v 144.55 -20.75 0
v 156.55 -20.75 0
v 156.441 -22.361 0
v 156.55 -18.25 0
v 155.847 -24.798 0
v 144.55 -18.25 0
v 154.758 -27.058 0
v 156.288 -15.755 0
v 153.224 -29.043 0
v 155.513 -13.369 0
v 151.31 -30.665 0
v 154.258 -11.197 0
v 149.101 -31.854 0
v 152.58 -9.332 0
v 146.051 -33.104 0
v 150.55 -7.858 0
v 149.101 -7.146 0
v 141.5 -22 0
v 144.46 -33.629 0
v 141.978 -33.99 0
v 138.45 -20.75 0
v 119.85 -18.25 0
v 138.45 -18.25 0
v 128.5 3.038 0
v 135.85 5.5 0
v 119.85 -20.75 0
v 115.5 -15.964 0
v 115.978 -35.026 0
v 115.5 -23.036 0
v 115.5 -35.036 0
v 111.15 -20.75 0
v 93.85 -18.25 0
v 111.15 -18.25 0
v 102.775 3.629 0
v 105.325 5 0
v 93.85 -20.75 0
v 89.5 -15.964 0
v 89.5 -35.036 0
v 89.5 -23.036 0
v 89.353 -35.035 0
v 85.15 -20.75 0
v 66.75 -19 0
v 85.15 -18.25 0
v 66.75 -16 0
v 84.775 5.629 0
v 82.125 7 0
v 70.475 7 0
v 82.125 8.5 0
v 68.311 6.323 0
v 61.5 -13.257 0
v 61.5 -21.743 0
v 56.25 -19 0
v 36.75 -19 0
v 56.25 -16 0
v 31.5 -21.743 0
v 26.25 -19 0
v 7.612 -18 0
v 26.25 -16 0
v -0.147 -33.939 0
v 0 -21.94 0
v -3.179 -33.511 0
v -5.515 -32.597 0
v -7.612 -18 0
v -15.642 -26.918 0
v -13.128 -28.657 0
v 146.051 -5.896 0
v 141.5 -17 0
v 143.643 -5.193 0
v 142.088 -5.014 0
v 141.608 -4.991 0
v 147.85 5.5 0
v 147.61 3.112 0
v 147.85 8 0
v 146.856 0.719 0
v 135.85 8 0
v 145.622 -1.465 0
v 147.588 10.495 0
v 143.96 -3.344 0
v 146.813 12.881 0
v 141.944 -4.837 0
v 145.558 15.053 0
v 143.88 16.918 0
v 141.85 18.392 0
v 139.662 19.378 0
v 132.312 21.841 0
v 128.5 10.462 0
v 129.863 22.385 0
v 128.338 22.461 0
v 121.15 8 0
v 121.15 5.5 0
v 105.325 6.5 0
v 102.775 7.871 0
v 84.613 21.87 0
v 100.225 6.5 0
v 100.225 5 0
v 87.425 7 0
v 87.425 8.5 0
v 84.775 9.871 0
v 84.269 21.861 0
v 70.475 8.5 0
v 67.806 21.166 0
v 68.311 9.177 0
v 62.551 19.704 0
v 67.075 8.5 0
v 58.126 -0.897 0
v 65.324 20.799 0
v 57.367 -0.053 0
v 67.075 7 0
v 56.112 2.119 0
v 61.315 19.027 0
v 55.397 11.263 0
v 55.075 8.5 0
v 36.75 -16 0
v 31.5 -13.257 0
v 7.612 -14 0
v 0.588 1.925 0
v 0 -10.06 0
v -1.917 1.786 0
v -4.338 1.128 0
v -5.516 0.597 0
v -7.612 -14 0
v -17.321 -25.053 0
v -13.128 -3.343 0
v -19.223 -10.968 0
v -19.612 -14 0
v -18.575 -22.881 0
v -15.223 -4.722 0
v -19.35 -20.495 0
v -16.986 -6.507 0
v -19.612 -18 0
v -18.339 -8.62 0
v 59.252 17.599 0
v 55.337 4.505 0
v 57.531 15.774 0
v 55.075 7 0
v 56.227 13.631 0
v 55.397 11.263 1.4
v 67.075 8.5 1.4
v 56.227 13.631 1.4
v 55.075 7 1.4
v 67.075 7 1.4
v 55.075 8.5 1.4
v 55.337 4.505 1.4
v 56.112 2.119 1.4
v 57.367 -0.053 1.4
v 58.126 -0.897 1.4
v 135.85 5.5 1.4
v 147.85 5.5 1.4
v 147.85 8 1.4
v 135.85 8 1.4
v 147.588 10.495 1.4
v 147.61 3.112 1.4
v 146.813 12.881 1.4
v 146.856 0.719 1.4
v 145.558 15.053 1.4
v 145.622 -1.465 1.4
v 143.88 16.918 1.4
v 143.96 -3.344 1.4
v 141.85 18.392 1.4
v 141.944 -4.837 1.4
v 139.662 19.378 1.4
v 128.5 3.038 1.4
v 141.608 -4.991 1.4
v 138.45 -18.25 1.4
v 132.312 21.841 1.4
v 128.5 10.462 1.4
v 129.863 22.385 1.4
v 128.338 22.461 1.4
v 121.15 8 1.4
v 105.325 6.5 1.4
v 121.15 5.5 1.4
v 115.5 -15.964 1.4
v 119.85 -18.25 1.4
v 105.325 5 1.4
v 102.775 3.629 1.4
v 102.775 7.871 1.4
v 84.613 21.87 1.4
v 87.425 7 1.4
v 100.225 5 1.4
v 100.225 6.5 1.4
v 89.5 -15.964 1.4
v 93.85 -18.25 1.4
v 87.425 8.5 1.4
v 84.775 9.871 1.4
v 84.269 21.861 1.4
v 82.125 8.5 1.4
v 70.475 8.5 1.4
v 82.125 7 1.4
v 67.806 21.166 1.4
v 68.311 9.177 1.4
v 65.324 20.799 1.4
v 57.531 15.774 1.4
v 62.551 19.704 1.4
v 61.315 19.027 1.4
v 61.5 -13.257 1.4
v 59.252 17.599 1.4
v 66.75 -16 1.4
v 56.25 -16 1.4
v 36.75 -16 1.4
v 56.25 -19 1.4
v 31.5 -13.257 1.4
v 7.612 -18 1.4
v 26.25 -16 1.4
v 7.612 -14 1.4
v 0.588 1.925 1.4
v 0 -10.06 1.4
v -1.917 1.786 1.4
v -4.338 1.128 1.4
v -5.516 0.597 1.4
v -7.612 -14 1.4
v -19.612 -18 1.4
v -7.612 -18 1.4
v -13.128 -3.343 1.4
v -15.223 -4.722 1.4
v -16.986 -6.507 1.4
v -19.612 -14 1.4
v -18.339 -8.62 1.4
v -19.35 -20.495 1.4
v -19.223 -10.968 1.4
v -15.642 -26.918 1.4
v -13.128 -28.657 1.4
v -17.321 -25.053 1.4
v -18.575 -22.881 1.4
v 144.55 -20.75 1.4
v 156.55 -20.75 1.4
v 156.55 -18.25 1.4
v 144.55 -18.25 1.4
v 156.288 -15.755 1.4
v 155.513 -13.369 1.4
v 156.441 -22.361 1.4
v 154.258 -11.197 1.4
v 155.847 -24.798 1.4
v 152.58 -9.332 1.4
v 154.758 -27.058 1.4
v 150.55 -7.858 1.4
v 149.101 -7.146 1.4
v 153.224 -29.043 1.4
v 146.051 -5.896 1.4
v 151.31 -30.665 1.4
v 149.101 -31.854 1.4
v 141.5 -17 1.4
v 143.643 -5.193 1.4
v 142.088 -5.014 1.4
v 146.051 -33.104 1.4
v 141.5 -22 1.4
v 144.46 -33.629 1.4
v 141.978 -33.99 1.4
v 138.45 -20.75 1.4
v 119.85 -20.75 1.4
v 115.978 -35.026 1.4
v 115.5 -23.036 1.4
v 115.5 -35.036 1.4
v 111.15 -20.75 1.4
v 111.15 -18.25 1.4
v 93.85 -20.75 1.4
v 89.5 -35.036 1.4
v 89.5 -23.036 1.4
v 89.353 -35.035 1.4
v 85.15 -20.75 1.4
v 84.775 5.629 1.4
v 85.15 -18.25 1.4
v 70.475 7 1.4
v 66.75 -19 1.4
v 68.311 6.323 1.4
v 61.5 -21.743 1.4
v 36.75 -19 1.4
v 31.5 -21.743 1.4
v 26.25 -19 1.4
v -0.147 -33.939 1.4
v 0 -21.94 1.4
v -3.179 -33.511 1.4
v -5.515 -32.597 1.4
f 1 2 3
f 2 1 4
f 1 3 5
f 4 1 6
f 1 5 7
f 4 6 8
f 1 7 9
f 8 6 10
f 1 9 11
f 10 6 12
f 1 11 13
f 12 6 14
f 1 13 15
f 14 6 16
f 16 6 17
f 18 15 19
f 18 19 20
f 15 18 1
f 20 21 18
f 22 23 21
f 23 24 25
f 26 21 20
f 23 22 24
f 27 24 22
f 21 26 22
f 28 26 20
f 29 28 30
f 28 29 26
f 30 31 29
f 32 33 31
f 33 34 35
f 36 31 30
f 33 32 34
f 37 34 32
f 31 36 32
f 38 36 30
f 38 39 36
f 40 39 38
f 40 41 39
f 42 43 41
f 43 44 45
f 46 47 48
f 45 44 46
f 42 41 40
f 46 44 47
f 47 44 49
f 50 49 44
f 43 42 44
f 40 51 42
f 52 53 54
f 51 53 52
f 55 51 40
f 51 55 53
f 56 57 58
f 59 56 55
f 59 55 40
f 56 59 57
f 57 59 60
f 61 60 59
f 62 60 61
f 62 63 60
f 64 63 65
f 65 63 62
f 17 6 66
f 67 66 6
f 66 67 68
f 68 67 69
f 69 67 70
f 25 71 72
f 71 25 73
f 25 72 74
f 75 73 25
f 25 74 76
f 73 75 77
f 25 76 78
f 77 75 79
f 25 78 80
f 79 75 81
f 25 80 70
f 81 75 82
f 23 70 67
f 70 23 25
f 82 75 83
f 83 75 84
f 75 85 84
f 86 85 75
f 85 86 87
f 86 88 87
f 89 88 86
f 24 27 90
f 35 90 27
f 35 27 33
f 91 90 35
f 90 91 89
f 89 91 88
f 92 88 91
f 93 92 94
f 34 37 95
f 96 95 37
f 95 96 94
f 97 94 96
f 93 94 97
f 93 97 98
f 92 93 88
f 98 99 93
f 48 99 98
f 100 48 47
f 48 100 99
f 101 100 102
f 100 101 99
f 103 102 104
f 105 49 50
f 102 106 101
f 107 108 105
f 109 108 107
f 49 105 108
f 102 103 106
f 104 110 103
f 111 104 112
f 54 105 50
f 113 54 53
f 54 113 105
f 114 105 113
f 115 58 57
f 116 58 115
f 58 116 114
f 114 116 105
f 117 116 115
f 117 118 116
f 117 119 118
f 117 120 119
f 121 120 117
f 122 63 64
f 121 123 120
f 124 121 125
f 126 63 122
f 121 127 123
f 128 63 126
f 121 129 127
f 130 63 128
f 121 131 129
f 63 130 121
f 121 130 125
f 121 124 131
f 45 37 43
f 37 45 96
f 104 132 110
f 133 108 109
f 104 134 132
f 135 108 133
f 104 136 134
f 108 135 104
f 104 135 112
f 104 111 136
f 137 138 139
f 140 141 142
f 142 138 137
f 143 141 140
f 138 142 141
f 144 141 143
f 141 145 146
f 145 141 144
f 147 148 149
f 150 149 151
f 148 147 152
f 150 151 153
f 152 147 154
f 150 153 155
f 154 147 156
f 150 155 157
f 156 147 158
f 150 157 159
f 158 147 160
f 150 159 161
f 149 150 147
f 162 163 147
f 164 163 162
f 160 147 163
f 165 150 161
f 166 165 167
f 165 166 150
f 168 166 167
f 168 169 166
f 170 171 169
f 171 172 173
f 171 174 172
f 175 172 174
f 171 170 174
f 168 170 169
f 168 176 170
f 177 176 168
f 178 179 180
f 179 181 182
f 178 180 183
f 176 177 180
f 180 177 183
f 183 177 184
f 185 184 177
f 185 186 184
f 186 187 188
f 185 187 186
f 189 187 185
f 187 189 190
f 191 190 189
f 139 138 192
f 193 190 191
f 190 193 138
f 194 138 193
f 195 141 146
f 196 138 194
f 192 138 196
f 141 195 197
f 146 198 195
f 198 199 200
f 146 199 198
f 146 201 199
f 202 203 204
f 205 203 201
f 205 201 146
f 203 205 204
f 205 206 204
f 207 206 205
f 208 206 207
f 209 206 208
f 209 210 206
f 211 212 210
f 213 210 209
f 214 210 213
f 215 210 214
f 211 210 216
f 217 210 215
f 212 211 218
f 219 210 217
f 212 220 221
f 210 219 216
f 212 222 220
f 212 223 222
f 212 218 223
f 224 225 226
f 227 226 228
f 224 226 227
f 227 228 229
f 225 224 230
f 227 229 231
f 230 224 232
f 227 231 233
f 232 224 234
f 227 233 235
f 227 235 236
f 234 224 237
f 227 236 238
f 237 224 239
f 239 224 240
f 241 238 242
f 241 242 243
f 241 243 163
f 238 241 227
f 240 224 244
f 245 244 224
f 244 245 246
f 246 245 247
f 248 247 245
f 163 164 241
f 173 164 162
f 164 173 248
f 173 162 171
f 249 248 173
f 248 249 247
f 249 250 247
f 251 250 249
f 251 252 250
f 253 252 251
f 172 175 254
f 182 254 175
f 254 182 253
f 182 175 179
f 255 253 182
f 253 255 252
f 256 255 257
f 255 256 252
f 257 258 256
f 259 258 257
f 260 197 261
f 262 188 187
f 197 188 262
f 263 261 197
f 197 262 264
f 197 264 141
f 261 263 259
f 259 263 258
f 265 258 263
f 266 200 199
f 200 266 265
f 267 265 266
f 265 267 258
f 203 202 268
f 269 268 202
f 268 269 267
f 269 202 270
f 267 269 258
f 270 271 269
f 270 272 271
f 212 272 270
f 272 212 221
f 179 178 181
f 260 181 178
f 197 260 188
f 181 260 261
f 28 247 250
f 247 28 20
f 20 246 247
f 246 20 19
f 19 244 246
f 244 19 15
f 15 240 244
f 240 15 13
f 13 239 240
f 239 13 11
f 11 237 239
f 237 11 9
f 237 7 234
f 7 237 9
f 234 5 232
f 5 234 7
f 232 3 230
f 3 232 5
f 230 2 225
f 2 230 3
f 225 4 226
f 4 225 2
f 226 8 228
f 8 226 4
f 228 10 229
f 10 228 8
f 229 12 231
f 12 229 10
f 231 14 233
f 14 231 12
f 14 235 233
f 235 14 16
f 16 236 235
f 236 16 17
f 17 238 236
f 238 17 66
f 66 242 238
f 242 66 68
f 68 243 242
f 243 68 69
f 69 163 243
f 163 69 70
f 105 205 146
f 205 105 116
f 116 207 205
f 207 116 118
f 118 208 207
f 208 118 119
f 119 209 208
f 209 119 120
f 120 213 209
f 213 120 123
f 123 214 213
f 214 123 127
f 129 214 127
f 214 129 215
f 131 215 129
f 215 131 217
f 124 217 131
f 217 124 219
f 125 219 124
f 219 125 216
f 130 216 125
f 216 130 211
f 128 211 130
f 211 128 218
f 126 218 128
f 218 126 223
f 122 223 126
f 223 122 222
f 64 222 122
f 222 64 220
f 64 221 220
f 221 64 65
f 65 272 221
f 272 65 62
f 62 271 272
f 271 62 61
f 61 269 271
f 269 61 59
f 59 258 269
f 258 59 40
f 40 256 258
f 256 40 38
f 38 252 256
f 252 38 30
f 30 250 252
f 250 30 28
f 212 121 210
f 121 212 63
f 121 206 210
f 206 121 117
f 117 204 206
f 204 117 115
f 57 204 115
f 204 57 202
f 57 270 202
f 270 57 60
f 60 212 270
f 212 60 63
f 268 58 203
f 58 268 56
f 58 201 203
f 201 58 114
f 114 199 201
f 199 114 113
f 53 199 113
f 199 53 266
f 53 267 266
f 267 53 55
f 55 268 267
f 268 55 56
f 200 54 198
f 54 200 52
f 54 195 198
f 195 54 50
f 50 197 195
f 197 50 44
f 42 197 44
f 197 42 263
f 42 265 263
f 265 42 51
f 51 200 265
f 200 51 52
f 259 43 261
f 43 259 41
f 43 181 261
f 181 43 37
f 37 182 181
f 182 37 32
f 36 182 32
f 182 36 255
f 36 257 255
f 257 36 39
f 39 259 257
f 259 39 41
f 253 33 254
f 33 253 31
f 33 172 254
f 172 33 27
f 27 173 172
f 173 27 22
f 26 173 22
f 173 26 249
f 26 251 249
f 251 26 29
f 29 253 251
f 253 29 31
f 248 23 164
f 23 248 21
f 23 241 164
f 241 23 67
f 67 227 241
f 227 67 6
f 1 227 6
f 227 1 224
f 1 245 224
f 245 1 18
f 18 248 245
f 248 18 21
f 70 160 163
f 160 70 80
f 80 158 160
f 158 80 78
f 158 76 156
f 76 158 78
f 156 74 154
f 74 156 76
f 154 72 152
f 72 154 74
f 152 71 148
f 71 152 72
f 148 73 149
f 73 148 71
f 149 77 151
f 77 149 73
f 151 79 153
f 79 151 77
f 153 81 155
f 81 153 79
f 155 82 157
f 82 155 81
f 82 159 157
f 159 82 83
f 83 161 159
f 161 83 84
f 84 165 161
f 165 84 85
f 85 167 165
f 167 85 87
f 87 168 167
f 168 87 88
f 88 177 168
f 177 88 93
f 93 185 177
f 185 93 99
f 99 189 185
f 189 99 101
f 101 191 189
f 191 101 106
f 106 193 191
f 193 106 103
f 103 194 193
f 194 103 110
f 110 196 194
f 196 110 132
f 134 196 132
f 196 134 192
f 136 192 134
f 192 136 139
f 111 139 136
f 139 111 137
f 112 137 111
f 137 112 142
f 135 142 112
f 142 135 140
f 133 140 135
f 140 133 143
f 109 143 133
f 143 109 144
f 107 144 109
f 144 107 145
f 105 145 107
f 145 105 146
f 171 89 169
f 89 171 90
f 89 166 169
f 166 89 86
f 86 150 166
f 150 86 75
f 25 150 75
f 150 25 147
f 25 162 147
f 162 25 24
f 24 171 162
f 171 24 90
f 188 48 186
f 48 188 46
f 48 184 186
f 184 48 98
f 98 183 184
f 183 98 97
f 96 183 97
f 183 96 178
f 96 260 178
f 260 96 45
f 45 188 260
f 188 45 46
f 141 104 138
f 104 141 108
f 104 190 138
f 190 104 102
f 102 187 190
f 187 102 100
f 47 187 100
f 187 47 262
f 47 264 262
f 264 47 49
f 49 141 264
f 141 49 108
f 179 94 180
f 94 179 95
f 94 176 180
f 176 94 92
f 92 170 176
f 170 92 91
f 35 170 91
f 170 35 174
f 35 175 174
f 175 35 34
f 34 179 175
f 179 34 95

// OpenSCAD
PHILLIPS_SIZES = [
  [6, 30, true],
  [6, 30, true],
  [6, 30, true],
  [3, 16, false],
  [5, 30, true],
  [3, 16, false],
  [3, 20, false]
];

FLAT_SIZES = [
  [
    [[8, 14.5], 32, true],
    [[6, 10.5], 29, true, -1.5 + 1],
    [[6, 10.5], 29, true, 1],
    [[5, 8.7], 25, true, 1], 
    [[5, 8.7], 25, true, 1],
    [[5, 6.1], 25, false, 1]
  ],
  [
    [[5, 14], 30, true, -137.5 + 25 / 2 - 3.5, -3.75],
    [[3, 5.1], 19, true, 0, .75],
    [[3, 5.3], 15, true, 1, 4.75],
    [[3, 3.4], 15, false, 1, 4.75],

  ]
];

FLAT_DIAMETERS = [for(i = FLAT_SIZES) [ for(j = i) j[0][0]]];
FLAT_MAXES = [for(i = FLAT_DIAMETERS) max(i)];

TORX_SIZES = [

];

module holeSlicer(sizes, x = 0, lastOffset = 0, xScale = 1) {
  maxSize = max([for(i = sizes) i[1]]);
  hole = sizes[x];
  
  if (hole) {
    yShift = is_undef(hole[4]) ? 0 : hole[4];
    translate([lastOffset, yShift -maxSize / 2 - (maxSize - hole[1]) / 2, 0]) {
      if (is_list(hole[0])) {
        if (hole[2] == true) {
          hull() {
            rotate([0, 0, 45]) 
              square(hole[0][0] * xScale, center = true);

            square([hole[0][1] * xScale, hole[0][0] / 2], true);
          }
        } else {
          hull() {
            circle(d = hole[0][0] * xScale);
            square([hole[0][1] * xScale, hole[0][0] / 2], true);
          }
        }                
      } else {
        if (hole[2] == true) {
          square(hole[0] * xScale, center = true);
        } else {
          circle(d = hole[0] * xScale);
        }
      }
      
      %circle(d = hole[1]);
    }
      
    if (x < len(sizes) - 1) {
      shift = is_undef(sizes[x + 1][3]) ? 0 : sizes[x + 1][3];
      holeSlicer(sizes, x + 1, lastOffset + (xScale * (sizes[x][1] / 2 + sizes[x + 1][1] / 2 + shift)));
    }
  }
}

linear_extrude(.28 * 5) hullDifference(12) {
  holeSlicer(FLAT_SIZES[0], 0, 0, 1.05);
}
linear_extrude(.28 * 5) hullDifference(12) {
  mirror([1,0,0]) translate([0, 25.5, 0]) 
    holeSlicer(FLAT_SIZES[1], 0, is_undef(FLAT_SIZES[1][0][3]) ? 0 : FLAT_SIZES[1][0][3], 1.05);
}

module hullDifference(offset = 0) {
  difference() {
    offset(r = offset) 
      hull()
        children();

    children();
  }
}

module screwDriverHoleSlicer(
  holes = [], 
  rowIndex = 0, 
  holeIndex = 0, 
  xOffset = 10, 
  yOffset = 10, 
  minSpacing = 3, 
  holeMax = 0,
  expand = false,
  reverse = false,
  scalar = 1.1
) {
  if (rowIndex < len(holes)) {
    row = holes[rowIndex]; 
    
    if (holeIndex < len(row)) {
      hole = row[holeIndex];
      
      translate([xOffset, hole[1] / 2, 0]) {
        if (expand) {
          circle(d = hole[1] * expand);
        } else {
          if (is_list(hole[0])) {
            if (hole[2] == true) {
              hull() {
                rotate([0, 0, 45]) 
                  square(hole[0][0] * scalar, center = true);

                square([hole[0][0] * 2, hole[0][0] / 1.5], true);
              }
            } else {
              hull() {
                circle(d = hole[0][0] * scalar);
                square([hole[0][0] * 2, hole[0][0] / 1.5], true);
              }
            }                
          } else {
            if (hole[2] == true) {
              square(hole[0] * scalar, center = true);
            } else {
              circle(d = hole[0] * scalar);
            }
          }
          
          %circle(d = hole[1]);
        }
      }
      
      nextXOffset = reverse ?
        xOffset - minSpacing - 
          (hole[1] / 2) -
          ((holeIndex < len(row) - 1) ? row[holeIndex + 1][1] / 2 : 0)
      :
        xOffset + minSpacing + 
          (hole[1] / 2) +
          ((holeIndex < len(row) - 1) ? row[holeIndex + 1][1] / 2 : 0);
             
      screwDriverHoleSlicer(
        holes, 
        rowIndex,
        holeIndex + 1, 
        nextXOffset - ((holeIndex >= len(row) -1) ? minSpacing : 0), 
        yOffset, 
        minSpacing, 
        holeMax, 
        expand,
        reverse
      );
    } else {
      translate([0, yOffset + holeMax + minSpacing * 2, 0]) {
        screwDriverHoleSlicer(
          holes, 
          rowIndex + 1, 
          0, 
          xOffset - row[holeIndex - 1][1] / 2,
          yOffset + holeMax, 
          minSpacing, 
          0,
          expand,
          !reverse
        );
      }
    }
  }
}
